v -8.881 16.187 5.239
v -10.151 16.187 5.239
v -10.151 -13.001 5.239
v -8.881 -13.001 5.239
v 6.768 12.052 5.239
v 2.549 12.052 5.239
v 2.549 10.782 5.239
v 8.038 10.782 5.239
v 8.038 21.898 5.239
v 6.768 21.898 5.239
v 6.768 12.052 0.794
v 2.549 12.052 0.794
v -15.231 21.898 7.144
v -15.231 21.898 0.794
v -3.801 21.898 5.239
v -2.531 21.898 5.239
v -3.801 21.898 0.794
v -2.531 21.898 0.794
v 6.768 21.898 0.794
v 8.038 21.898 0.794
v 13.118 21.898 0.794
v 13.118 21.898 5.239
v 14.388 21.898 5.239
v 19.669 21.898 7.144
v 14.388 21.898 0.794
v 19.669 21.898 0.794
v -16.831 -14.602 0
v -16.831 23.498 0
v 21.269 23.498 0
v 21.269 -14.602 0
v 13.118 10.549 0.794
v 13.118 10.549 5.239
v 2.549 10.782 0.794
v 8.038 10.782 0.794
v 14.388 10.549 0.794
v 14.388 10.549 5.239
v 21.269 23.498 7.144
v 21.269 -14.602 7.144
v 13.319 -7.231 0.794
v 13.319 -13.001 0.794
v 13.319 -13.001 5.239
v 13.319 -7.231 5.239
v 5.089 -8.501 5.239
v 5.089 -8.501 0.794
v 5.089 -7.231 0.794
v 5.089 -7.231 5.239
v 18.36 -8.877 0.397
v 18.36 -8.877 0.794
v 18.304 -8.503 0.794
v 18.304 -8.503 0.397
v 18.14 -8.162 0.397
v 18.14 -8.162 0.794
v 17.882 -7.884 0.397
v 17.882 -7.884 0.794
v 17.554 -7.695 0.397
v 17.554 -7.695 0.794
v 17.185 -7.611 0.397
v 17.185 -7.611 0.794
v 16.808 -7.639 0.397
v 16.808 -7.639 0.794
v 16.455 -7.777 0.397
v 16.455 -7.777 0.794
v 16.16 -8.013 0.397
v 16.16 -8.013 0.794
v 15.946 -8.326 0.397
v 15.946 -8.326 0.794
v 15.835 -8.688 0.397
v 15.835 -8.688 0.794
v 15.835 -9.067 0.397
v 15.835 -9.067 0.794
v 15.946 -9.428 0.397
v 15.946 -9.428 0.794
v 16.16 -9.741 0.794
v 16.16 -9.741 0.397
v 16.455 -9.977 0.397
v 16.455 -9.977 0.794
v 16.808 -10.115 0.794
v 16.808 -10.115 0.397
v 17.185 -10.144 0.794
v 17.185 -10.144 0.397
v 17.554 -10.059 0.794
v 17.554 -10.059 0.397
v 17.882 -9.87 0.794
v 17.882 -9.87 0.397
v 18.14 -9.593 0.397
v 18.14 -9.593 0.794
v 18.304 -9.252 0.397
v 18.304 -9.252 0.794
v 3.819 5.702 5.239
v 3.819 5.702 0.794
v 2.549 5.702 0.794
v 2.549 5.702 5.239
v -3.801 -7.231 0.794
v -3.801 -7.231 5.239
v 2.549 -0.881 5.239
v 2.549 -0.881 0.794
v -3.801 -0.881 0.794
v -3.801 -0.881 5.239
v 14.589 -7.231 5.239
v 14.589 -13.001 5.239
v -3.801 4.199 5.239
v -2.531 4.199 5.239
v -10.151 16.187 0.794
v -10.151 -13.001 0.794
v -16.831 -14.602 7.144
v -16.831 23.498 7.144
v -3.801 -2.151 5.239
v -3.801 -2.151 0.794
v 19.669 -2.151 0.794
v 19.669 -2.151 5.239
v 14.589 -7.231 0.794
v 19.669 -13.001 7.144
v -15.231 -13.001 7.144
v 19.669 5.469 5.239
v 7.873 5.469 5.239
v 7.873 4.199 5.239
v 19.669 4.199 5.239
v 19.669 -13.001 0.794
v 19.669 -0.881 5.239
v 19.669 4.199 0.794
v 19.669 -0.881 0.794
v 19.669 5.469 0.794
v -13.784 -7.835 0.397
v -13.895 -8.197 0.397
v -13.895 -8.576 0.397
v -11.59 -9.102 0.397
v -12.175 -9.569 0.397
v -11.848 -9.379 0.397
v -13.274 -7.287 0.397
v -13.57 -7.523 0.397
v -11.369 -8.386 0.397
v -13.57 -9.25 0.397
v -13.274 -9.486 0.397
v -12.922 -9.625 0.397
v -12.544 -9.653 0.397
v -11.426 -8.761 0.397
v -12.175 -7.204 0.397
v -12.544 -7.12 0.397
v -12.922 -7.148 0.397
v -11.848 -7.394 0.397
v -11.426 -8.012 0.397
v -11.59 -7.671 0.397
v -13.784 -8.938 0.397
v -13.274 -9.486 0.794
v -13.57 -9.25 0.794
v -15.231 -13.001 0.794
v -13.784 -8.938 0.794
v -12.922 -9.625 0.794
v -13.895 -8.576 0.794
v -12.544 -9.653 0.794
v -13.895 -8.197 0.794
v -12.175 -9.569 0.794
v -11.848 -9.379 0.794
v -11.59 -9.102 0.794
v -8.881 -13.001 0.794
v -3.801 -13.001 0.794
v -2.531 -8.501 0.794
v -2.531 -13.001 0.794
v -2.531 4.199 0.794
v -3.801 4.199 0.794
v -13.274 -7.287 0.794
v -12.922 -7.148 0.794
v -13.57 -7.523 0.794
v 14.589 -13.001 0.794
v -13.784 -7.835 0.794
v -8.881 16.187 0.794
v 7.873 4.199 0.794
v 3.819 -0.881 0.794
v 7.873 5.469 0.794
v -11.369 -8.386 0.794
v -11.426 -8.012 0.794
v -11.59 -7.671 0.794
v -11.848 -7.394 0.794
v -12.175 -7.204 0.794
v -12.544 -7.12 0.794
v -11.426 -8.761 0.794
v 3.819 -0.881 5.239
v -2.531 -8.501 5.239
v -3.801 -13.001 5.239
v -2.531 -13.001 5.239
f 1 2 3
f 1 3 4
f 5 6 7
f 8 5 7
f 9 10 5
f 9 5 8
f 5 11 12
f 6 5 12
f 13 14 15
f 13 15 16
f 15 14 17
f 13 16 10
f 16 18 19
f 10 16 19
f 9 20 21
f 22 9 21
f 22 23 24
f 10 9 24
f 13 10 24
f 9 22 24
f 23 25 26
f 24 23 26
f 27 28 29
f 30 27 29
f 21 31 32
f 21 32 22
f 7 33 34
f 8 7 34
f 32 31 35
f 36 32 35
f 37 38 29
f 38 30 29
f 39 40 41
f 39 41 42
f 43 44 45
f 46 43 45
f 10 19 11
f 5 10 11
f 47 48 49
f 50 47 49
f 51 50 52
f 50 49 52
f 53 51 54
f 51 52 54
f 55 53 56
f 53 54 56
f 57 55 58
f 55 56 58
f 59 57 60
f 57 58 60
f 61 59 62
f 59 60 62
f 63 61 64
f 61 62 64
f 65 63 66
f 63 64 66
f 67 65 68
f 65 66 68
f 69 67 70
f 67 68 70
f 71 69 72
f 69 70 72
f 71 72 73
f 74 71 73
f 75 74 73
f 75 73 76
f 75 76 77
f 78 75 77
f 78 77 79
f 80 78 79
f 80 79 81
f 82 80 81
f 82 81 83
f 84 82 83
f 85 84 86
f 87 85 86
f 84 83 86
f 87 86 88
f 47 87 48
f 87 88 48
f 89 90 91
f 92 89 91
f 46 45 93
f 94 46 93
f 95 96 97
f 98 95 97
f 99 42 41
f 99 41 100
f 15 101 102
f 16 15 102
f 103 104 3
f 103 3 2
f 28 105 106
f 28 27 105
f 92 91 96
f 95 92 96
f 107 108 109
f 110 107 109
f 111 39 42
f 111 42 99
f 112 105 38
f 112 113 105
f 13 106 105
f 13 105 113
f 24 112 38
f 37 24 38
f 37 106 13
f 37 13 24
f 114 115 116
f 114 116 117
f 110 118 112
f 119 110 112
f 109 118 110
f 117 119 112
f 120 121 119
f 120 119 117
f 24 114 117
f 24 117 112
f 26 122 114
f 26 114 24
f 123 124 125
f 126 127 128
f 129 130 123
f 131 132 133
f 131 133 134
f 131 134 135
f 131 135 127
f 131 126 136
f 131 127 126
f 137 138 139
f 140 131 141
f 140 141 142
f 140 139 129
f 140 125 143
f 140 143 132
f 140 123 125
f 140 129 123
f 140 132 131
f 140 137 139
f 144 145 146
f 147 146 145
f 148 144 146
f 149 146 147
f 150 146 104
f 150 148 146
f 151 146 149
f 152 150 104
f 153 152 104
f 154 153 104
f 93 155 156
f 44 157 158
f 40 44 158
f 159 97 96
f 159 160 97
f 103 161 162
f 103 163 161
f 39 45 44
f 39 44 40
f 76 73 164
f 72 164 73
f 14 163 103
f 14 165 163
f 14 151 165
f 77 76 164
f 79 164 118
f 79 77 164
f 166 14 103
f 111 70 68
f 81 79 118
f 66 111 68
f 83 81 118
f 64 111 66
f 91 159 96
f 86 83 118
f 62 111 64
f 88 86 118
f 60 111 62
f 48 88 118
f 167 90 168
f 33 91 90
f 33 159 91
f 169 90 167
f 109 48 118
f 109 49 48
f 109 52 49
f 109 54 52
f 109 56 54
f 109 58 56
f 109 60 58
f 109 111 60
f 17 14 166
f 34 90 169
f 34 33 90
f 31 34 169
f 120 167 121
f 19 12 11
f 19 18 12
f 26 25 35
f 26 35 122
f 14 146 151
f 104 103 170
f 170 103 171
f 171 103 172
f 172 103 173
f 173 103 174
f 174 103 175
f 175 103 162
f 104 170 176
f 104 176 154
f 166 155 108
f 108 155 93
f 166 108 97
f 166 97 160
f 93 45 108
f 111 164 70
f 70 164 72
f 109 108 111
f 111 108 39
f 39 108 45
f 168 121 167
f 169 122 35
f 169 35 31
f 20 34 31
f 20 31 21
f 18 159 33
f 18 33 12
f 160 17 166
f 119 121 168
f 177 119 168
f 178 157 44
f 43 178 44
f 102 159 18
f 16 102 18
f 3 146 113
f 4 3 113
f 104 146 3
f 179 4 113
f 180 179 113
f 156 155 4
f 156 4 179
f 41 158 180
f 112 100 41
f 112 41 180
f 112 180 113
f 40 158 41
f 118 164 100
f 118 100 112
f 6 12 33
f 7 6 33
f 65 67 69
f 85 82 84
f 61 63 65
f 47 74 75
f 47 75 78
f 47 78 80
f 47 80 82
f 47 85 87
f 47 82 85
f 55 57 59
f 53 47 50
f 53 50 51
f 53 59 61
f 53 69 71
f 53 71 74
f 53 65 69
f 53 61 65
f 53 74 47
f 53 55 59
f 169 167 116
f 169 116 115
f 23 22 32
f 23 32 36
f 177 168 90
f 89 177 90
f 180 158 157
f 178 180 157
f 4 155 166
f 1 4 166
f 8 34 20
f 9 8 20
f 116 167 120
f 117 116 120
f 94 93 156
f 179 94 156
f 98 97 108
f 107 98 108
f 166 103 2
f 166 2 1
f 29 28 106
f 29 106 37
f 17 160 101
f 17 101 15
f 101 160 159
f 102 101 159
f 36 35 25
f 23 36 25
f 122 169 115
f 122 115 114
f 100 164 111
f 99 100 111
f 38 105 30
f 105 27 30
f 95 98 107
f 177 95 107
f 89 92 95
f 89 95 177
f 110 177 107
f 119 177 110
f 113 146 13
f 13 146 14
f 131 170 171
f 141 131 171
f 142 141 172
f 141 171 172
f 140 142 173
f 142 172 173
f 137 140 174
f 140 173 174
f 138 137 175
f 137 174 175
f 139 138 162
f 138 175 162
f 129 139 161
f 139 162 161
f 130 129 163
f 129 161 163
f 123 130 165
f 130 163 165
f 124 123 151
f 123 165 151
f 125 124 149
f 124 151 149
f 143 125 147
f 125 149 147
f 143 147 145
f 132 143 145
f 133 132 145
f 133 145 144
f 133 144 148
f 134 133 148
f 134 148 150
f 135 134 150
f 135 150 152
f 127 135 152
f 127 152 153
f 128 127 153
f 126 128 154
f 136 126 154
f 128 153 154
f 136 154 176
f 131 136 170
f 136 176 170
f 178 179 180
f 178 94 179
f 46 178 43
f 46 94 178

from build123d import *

# Parameters (mm, degrees)
F0_W     = 38.1
F0_H     = 38.1
F1_DEPTH = 0.79375
F2_W     = 38.1
F2_H     = 38.1
F2_W_2   = 34.8996
F2_H_2   = 34.8996
F3_DEPTH = 6.35
F4_W     = 1.27
F4_H     = 17.6995960579
F4_H_2   = 29.188188513
F4_W_2   = 11.795372231
F4_H_3   = 1.27
F4_H_4   = 11.3495960579
F4_H_5   = 5.7700039421
F6_DEPTH = 4.445
F5_R     = 1.27
F7_DEPTH = 0.396875


# Not quite as in the source:
# - a feature names something its author has since deleted; it is built from what else it names


with BuildPart() as f1:
    # F0 (on Top) → F1 (new body)
    with BuildSketch(Plane.XY):
        with Locations((2.218876034, 4.4484467313)):
            Rectangle(F0_W, F0_H)
    extrude(amount=F1_DEPTH)

    # F2 (on face) → F3 (join)
    with BuildSketch(Plane.XY.offset(0.79375)):
        with Locations((2.218876034, 4.4484467313)):
            Rectangle(F2_W, F2_H)
        with Locations((2.218876034, 4.4484467313)):
            Rectangle(F2_W_2, F2_H_2, mode=Mode.SUBTRACT)
    extrude(amount=F3_DEPTH)

    # F4 (on face) → F6 (join)
    with BuildSketch(Plane.XY.offset(0.79375)):
        with Locations((-3.165923966, 13.0484487024)):
            Rectangle(F4_W, F4_H)
        with Locations((-9.515923966, 1.5927409878)):
            Rectangle(F4_W, F4_H_2)
        Polygon((-3.800923966, -2.1513493266), (19.668676034, -2.1513493266), (19.668676034, -0.8813493266), (3.819076034, -0.8813493266), (3.819076034, 5.701588226), (2.549076034, 5.701588226), (2.549076034, -0.8813493266), (-3.800923966, -0.8813493266), align=None)
        Polygon((-3.800923966, -8.5013493266), (-3.800923966, -13.0013532687), (-2.530923966, -13.0013532687), (-2.530923966, -8.5013493266), (5.089076034, -8.5013493266), (5.089076034, -7.2313493266), (3.819076034, -7.2313493266), (-3.800923966, -7.2313493266), align=None)
        Polygon((8.0383015836, 21.8982467313), (6.7683015836, 21.8982467313), (6.7683015836, 12.051588226), (2.549076034, 12.051588226), (2.549076034, 10.781588226), (8.0383015836, 10.781588226), align=None)
        with Locations((13.7709899185, 4.8336506734)):
            Rectangle(F4_W_2, F4_H_3)
        with Locations((13.7533015836, 16.2234487024)):
            Rectangle(F4_W, F4_H_4)
        with Locations((13.953676034, -10.1163512976)):
            Rectangle(F4_W, F4_H_5)
    extrude(amount=F6_DEPTH)

    # F5 (on face) → F7 (cut)
    with BuildSketch(Plane.XY.offset(0.79375)):
        with Locations((17.0904958928, -8.8772866875)):
            Circle(F5_R)
        with Locations((-12.6393535174, -8.3864945918)):
            Circle(F5_R)
    extrude(amount=-F7_DEPTH, mode=Mode.SUBTRACT)


solid = f1.part
